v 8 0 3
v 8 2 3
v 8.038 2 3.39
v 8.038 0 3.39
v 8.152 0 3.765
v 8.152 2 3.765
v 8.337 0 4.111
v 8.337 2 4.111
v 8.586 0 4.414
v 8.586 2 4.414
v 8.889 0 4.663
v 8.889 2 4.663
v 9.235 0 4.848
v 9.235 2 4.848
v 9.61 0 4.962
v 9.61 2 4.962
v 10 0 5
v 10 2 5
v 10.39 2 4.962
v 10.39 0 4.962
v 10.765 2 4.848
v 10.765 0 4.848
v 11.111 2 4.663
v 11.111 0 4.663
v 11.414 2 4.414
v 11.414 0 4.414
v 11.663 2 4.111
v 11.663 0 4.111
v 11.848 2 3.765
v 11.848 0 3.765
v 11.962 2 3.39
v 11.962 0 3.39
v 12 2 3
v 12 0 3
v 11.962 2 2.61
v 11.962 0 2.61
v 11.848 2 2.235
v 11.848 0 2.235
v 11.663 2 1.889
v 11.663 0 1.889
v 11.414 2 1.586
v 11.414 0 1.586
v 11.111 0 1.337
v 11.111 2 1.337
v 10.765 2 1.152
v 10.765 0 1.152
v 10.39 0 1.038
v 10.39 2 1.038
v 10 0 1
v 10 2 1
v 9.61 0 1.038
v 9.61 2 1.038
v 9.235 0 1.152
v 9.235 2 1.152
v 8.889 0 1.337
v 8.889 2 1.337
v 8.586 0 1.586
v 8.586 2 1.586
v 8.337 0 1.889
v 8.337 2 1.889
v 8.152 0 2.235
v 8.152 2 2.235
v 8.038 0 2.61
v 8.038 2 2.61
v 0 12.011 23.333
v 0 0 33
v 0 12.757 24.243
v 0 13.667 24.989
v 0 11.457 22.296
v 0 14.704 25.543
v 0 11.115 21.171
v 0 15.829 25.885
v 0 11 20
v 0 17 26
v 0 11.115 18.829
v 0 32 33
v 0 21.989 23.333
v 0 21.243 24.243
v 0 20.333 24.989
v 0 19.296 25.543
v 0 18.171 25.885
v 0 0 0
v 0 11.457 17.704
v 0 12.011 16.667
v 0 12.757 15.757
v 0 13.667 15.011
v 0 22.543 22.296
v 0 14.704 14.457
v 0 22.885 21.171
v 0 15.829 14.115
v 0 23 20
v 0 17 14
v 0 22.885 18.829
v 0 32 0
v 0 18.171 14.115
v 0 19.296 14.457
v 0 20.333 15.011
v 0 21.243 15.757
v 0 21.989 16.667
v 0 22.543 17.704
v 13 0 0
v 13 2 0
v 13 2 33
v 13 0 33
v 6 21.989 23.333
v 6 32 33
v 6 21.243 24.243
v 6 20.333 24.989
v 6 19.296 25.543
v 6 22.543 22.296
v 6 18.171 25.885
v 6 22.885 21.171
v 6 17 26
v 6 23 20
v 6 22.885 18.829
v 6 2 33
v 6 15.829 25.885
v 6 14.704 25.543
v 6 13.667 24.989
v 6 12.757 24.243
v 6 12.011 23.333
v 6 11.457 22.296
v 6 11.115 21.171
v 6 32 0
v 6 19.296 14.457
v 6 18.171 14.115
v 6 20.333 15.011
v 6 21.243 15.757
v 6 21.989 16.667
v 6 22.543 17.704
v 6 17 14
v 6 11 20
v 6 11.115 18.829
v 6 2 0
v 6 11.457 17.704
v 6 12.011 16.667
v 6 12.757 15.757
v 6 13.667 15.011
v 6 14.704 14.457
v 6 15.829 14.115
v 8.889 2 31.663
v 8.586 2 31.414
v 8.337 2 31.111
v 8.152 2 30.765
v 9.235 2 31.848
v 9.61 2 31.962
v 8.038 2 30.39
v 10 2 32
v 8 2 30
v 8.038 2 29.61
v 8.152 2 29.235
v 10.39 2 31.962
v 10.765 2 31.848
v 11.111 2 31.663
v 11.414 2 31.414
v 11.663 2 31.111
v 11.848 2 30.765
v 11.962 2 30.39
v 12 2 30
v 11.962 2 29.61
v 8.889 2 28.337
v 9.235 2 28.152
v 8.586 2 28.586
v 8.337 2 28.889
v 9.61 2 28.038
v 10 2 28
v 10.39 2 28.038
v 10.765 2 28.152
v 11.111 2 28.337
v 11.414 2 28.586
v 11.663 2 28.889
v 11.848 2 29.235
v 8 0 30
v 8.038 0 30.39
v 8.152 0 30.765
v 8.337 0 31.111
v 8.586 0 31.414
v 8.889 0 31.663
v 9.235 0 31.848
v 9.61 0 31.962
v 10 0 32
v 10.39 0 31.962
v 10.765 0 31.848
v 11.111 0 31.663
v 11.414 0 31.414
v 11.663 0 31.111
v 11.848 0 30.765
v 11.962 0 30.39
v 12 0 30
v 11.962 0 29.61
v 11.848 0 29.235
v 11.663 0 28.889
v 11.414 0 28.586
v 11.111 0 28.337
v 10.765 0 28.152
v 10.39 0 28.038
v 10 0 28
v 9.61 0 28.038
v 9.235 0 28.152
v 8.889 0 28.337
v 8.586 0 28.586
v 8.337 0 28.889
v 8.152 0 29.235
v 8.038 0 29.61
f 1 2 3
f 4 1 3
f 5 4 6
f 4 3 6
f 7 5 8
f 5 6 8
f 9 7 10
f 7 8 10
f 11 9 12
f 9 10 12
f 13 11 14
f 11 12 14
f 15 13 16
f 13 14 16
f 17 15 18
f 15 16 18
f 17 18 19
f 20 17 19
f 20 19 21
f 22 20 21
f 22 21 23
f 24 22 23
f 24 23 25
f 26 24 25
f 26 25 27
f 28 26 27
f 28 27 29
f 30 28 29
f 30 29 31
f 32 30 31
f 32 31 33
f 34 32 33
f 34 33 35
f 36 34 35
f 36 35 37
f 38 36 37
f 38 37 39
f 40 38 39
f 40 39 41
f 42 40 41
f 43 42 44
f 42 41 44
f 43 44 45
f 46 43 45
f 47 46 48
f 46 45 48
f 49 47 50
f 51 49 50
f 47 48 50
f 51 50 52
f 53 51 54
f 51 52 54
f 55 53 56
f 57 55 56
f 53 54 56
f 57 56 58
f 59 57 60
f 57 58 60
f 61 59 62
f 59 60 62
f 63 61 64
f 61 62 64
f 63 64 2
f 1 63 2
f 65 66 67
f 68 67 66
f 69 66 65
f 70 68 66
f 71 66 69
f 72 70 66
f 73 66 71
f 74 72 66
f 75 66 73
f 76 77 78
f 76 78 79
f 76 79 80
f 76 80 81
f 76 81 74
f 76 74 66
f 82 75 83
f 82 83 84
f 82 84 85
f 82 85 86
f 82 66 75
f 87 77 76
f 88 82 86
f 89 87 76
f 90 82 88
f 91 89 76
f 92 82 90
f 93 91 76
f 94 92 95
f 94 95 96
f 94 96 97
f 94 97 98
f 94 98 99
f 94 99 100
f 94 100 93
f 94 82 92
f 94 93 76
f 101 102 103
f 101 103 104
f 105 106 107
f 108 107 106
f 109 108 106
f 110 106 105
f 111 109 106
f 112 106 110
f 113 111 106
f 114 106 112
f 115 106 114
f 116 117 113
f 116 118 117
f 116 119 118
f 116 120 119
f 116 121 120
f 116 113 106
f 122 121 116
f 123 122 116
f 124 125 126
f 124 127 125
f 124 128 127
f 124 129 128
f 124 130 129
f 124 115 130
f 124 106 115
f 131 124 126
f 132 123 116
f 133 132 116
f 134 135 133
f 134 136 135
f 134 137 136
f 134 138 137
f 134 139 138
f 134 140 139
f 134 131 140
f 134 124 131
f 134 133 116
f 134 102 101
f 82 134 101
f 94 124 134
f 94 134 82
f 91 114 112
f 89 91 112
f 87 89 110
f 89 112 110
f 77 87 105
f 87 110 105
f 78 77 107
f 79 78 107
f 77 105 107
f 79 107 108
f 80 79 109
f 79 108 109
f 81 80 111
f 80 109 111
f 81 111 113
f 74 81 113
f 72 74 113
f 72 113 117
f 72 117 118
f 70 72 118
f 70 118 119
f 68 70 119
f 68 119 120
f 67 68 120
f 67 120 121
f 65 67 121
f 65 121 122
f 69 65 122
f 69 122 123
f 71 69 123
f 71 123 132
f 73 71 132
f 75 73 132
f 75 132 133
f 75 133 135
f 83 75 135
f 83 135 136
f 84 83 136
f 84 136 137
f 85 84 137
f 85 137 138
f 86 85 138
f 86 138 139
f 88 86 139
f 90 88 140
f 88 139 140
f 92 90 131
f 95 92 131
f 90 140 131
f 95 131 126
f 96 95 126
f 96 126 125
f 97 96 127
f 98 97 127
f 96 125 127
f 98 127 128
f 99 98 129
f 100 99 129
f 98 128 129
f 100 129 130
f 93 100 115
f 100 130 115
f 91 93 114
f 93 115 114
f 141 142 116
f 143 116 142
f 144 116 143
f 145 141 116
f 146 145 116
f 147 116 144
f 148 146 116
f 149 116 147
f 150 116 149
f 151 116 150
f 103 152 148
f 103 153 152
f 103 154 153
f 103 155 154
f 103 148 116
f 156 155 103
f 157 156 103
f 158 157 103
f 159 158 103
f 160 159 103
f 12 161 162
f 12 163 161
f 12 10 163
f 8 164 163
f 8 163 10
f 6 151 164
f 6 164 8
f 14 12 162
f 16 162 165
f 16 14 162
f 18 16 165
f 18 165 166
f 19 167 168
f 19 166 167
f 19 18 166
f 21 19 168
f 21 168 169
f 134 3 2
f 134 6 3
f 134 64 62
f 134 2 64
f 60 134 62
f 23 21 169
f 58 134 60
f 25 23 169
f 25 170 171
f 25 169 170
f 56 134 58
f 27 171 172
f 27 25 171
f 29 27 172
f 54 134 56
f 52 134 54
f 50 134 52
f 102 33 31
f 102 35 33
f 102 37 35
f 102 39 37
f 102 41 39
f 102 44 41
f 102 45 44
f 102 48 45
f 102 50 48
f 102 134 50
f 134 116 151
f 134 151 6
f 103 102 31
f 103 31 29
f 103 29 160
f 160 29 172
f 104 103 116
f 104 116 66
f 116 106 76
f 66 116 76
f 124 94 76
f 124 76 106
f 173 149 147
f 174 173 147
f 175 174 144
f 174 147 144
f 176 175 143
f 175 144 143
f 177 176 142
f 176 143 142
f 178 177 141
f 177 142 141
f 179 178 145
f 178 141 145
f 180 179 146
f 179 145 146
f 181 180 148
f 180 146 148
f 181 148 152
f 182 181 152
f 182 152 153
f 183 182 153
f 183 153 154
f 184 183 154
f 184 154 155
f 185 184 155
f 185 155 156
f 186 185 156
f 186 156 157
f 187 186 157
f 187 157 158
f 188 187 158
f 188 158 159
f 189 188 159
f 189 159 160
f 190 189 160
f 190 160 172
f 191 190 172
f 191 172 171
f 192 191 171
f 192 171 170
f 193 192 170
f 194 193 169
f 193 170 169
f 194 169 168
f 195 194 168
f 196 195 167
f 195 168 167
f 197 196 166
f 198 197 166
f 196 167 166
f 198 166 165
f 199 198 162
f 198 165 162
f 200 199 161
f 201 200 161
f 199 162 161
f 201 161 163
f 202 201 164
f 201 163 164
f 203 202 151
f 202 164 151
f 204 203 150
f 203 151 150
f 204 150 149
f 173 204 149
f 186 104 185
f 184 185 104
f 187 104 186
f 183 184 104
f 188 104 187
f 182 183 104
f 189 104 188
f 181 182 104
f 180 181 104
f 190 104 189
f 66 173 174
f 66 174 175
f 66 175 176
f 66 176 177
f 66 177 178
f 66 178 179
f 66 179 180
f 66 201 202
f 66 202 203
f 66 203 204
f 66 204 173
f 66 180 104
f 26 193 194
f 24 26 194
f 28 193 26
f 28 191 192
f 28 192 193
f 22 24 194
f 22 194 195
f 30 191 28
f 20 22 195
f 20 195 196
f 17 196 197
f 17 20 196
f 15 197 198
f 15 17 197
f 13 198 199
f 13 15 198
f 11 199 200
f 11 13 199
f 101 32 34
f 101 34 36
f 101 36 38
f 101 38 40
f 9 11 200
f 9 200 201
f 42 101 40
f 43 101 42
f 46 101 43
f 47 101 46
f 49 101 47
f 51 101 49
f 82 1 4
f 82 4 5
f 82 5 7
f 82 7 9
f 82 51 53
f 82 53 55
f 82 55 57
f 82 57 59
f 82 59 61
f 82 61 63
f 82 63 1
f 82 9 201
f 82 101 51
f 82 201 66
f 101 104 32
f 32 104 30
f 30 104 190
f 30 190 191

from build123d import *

# Parameters (mm, degrees)
BOSS_EXTRUDE1_DEPTH = 33
CUT_EXTRUDE1_REACH  = 48.497
SKETCH2_R           = 6
CUT_EXTRUDE2_REACH  = 48.454
SKETCH3_R           = 2


with BuildPart() as part:
    # Sketch1 → Boss-Extrude1 (new body)
    with BuildSketch(Plane.XY):
        Polygon((0, 0), (0, 32), (6, 32), (6, 2), (13, 2), (13, 0), align=None)
    extrude(amount=BOSS_EXTRUDE1_DEPTH)

    # Sketch2 → Cut-Extrude1 (cut, up to next)
    with BuildSketch(Plane(origin=(6, 0, 0), x_dir=(0, 0, -1), z_dir=(1, 0, 0)), mode=Mode.PRIVATE) as cut_extrude1_sk1:
        with Locations(Location((-20, 17, 0), (0, 0, 90))):
            Circle(SKETCH2_R)
    cut_extrude1_tool1 = extrude(cut_extrude1_sk1.sketch, amount=-CUT_EXTRUDE1_REACH, mode=Mode.PRIVATE) & part.part
    add(cut_extrude1_tool1.solids().sort_by_distance((6, 17, 20))[0], mode=Mode.SUBTRACT)

    # Sketch3 → Cut-Extrude2 (cut, up to next)
    with BuildSketch(Plane(origin=(0, 2, 0), x_dir=(1, 0, 0), z_dir=(0, 1, 0)), mode=Mode.PRIVATE) as cut_extrude2_sk1:
        with Locations(Location((10, -3, 0), (0, 0, 180))):
            Circle(SKETCH3_R)
    cut_extrude2_tool1 = extrude(cut_extrude2_sk1.sketch, amount=-CUT_EXTRUDE2_REACH, mode=Mode.PRIVATE) & part.part
    # Sketch3 → Cut-Extrude2 (cut, up to next)
    with BuildSketch(Plane(origin=(0, 2, 0), x_dir=(1, 0, 0), z_dir=(0, 1, 0)), mode=Mode.PRIVATE) as cut_extrude2_sk2:
        with Locations(Location((10, -30, 0), (0, 0, 180))):
            Circle(SKETCH3_R)
    cut_extrude2_tool2 = extrude(cut_extrude2_sk2.sketch, amount=-CUT_EXTRUDE2_REACH, mode=Mode.PRIVATE) & part.part
    add(cut_extrude2_tool1.solids().sort_by_distance((10, 2, 3))[0], mode=Mode.SUBTRACT)
    add(cut_extrude2_tool2.solids().sort_by_distance((10, 2, 30))[0], mode=Mode.SUBTRACT)


solid = part.part
